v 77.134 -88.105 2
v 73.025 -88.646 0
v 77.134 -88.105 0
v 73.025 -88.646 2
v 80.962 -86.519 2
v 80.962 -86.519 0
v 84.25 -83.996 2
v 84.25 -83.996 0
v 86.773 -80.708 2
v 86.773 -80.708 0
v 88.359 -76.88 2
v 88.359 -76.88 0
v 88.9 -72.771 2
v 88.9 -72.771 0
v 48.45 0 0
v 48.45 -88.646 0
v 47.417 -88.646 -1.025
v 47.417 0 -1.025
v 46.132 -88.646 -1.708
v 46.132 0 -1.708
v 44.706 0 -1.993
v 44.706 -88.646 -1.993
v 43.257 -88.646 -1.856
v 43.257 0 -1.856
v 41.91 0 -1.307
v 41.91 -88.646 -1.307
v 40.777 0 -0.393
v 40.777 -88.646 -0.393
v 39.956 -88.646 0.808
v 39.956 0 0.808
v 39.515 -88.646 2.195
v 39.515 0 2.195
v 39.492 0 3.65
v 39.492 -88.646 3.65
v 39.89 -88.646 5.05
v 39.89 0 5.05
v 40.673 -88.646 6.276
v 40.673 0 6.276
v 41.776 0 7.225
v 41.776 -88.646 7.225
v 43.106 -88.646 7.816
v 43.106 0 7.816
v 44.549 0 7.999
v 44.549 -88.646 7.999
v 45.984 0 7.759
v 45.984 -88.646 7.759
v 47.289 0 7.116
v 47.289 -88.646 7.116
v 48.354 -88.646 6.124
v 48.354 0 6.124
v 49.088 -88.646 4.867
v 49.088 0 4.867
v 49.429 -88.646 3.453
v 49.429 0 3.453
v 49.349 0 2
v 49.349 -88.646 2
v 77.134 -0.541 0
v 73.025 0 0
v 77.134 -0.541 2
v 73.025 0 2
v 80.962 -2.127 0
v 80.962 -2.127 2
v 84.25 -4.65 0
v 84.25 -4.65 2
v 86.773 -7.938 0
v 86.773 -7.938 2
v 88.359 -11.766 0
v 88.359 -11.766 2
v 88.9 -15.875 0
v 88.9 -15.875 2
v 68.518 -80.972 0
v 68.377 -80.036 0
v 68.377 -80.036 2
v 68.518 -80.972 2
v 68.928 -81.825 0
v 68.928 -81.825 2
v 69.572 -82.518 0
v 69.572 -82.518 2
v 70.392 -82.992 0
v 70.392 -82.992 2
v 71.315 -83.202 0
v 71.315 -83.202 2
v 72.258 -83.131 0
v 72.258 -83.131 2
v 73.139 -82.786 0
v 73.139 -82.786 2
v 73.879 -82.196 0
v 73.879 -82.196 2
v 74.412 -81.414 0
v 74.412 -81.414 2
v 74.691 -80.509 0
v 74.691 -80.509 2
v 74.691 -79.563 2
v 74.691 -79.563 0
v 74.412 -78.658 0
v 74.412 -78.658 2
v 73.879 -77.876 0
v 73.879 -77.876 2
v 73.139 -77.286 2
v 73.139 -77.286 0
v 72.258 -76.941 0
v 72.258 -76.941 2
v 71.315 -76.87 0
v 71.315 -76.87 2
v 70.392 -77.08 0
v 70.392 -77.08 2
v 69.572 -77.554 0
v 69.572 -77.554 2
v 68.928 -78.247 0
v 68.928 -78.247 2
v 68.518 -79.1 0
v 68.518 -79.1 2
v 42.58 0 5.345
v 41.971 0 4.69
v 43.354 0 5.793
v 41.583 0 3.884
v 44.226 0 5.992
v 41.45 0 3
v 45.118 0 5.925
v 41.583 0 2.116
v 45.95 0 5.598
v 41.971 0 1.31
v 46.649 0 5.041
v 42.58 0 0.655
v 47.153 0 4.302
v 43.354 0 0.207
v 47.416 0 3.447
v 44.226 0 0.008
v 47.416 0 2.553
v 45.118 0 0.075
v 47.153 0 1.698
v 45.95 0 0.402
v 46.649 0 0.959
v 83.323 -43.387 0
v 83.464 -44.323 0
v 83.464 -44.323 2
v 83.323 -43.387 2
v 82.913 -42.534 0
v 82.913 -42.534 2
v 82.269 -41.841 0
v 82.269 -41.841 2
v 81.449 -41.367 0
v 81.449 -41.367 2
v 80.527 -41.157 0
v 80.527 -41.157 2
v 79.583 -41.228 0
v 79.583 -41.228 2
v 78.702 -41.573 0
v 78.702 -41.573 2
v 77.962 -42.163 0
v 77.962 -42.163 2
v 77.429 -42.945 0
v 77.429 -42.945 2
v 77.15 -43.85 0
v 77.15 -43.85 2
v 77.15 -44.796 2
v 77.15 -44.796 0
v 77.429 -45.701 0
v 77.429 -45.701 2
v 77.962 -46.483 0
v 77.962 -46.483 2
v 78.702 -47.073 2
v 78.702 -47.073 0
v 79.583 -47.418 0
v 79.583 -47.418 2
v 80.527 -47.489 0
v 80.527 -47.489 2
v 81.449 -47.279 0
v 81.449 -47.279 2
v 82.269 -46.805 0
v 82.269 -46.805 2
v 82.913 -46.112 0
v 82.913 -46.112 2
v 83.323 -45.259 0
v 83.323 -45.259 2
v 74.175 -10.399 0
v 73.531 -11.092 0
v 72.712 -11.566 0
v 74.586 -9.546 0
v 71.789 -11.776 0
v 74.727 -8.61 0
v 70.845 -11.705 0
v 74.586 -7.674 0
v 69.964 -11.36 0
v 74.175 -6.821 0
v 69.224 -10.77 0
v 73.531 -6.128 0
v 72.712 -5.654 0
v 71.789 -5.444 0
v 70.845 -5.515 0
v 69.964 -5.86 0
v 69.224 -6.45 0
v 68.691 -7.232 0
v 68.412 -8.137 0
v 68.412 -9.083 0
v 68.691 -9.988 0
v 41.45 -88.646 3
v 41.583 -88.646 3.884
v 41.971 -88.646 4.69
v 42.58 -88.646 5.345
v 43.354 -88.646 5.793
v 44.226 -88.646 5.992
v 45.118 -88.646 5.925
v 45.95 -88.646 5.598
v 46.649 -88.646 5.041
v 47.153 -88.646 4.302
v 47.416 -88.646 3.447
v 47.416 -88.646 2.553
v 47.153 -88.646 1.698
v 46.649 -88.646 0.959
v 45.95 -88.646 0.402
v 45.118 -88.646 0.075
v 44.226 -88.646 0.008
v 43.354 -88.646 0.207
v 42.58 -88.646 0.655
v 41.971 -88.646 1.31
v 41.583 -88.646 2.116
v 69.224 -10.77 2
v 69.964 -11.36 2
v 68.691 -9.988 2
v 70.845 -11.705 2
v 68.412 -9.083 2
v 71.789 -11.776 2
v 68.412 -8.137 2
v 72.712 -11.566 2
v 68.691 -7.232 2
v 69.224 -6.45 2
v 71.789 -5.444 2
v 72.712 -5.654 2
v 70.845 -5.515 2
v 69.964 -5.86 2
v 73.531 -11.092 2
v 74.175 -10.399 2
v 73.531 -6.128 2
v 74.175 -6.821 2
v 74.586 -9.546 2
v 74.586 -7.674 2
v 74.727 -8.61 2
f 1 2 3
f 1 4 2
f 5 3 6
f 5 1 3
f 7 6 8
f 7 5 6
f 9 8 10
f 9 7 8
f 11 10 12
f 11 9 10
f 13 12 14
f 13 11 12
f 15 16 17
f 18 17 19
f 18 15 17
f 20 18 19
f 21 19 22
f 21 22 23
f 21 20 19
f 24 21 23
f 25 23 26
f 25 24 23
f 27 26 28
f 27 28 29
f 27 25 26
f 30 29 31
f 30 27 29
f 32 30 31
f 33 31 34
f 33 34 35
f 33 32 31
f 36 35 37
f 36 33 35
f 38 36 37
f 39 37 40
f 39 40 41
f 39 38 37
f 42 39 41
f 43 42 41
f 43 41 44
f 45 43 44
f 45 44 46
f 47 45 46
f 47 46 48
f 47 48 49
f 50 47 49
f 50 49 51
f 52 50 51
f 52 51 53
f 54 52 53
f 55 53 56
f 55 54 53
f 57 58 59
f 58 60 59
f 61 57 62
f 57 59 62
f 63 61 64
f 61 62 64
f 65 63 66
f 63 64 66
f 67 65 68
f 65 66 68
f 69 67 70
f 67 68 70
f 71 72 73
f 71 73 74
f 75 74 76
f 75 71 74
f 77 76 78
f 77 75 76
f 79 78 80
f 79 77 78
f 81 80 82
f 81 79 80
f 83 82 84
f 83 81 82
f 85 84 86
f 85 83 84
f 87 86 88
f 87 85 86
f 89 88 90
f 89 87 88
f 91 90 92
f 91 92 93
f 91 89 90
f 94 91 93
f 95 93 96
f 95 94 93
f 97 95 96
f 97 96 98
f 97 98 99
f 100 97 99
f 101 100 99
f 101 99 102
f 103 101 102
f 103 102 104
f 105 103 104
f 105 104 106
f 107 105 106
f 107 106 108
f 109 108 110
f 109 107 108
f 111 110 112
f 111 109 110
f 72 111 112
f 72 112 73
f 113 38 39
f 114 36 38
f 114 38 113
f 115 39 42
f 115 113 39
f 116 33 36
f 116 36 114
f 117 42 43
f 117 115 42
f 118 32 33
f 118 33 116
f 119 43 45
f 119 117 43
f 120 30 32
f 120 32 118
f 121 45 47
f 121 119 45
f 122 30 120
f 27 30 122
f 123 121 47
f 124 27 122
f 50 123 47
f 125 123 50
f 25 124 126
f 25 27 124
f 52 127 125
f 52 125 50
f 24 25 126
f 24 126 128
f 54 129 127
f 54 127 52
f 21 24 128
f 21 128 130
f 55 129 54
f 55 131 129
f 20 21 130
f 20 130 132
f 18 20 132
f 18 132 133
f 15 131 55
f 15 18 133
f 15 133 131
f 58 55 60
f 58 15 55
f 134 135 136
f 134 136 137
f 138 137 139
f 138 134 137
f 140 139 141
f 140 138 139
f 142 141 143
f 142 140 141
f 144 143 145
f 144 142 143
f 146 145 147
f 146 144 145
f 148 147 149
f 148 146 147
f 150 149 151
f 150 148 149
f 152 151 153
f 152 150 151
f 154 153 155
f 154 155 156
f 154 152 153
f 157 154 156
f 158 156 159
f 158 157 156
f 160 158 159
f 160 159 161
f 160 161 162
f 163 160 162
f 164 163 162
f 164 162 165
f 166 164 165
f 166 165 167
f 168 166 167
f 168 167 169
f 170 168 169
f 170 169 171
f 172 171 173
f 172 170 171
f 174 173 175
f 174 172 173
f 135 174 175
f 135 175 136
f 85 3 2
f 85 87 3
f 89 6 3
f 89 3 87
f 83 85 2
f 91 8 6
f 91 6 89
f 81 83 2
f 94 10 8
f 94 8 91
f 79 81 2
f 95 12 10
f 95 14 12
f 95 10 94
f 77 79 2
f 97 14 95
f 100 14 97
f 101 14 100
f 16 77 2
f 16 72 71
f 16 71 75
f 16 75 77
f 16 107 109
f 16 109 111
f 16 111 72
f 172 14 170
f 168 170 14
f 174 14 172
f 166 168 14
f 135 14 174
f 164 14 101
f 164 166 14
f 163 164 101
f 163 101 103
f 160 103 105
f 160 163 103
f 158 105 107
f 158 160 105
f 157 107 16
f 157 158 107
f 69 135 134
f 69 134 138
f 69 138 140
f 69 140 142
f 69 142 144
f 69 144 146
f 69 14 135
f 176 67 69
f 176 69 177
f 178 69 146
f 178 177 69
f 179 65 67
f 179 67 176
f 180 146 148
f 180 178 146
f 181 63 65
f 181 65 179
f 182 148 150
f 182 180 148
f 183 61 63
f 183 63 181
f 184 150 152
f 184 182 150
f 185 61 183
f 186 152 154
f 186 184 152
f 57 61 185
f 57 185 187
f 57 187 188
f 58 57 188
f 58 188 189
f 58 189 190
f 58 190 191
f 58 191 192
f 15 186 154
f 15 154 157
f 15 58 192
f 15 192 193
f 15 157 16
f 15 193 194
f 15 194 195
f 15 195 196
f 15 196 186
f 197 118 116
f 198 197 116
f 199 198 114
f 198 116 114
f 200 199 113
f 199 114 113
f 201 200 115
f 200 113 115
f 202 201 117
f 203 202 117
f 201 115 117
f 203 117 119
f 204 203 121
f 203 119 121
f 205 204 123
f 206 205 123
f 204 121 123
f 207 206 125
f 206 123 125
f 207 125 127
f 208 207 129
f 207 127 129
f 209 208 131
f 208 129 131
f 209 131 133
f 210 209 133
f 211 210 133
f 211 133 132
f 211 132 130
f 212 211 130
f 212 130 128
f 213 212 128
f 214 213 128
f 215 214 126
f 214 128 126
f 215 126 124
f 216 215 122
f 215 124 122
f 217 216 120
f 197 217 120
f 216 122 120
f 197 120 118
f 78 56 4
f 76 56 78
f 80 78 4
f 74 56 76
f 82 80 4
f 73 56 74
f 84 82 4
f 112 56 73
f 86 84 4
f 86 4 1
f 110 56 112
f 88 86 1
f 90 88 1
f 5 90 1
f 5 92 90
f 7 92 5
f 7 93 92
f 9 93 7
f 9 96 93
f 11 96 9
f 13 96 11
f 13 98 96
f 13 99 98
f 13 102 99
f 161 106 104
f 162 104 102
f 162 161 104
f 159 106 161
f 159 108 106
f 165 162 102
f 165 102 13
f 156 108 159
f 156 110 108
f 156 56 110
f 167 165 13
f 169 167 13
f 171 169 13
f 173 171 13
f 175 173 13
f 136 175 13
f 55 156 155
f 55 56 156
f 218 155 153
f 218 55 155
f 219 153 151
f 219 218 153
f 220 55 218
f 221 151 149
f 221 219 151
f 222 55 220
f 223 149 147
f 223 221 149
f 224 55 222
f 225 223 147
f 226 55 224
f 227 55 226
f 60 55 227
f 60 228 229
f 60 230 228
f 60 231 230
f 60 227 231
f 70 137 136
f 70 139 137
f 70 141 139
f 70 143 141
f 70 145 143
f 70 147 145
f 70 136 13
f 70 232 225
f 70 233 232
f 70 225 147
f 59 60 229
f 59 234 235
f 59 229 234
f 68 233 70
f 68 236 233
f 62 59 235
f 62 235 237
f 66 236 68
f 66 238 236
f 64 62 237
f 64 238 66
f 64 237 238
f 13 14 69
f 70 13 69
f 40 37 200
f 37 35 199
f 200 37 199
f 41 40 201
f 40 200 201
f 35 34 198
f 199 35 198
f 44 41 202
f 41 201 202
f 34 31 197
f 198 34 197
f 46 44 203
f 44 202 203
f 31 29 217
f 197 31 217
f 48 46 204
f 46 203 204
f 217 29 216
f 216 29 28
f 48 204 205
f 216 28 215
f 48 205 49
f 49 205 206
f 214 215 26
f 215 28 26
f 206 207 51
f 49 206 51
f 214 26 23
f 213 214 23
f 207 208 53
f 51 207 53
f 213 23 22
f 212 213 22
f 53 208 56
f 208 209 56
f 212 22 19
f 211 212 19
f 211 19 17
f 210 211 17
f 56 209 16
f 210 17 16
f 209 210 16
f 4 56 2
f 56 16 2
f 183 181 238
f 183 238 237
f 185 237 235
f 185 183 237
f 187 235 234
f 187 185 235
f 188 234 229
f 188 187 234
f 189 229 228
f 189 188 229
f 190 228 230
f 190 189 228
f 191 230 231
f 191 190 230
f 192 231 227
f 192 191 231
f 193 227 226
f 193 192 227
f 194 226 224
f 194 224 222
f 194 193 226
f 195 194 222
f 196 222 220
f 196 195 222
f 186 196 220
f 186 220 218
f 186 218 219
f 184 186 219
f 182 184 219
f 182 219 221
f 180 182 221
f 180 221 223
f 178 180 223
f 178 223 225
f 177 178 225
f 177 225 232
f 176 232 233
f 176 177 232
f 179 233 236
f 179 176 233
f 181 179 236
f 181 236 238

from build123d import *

# Parameters (mm, degrees)
ESQUISSE1_W        = 39.45
ESQUISSE1_H        = 88.646
ESQUISSE1_R        = 3.175
BOSS_EXTRU_1_DEPTH = 2
CONG_1_R           = 15.875
ESQUISSE3_R        = 3
BOSS_EXTRU_2_DEPTH = 88.646


with BuildPart() as part:
    # Esquisse1 → Boss.-Extru.1 (new body)
    with BuildSketch(Plane.XY):
        with Locations((69.175, -44.323)):
            Rectangle(ESQUISSE1_W, ESQUISSE1_H)
        with Locations((80.2894, -44.323)):
            Circle(ESQUISSE1_R, mode=Mode.SUBTRACT)
        with Locations((71.5518, -8.61)):
            Circle(ESQUISSE1_R, mode=Mode.SUBTRACT)
        with Locations(Location((71.5518, -80.036, 0), (0, 0, 180))):
            Circle(ESQUISSE1_R, mode=Mode.SUBTRACT)
    extrude(amount=BOSS_EXTRU_1_DEPTH)

    # Congé1
    cong_1_edges = [part.edges().sort_by_distance(p)[0] for p in [
        (88.9, -88.646, 1),
        (88.9, 0, 1),
    ]]
    fillet(cong_1_edges, radius=CONG_1_R)

    # Esquisse3 → Boss.-Extru.2 (add)
    with BuildSketch(Plane(origin=(0, 0, 0), x_dir=(1, 0, 0), z_dir=(0, 1, 0))):
        with BuildLine():
            Line((49.45, 0), (48.45, 0))
            ThreePointArc((48.45, 0), (39.889522068, -5.049888053), (49.348979486, -2))
            Line((49.348979486, -2), (49.45, -2))
            Line((49.45, -2), (49.45, 0))
        make_face()
        with Locations(Location((44.45, -3, 0), (0, 0, 180))):
            Circle(ESQUISSE3_R, mode=Mode.SUBTRACT)
    extrude(amount=-BOSS_EXTRU_2_DEPTH)


solid = part.part
